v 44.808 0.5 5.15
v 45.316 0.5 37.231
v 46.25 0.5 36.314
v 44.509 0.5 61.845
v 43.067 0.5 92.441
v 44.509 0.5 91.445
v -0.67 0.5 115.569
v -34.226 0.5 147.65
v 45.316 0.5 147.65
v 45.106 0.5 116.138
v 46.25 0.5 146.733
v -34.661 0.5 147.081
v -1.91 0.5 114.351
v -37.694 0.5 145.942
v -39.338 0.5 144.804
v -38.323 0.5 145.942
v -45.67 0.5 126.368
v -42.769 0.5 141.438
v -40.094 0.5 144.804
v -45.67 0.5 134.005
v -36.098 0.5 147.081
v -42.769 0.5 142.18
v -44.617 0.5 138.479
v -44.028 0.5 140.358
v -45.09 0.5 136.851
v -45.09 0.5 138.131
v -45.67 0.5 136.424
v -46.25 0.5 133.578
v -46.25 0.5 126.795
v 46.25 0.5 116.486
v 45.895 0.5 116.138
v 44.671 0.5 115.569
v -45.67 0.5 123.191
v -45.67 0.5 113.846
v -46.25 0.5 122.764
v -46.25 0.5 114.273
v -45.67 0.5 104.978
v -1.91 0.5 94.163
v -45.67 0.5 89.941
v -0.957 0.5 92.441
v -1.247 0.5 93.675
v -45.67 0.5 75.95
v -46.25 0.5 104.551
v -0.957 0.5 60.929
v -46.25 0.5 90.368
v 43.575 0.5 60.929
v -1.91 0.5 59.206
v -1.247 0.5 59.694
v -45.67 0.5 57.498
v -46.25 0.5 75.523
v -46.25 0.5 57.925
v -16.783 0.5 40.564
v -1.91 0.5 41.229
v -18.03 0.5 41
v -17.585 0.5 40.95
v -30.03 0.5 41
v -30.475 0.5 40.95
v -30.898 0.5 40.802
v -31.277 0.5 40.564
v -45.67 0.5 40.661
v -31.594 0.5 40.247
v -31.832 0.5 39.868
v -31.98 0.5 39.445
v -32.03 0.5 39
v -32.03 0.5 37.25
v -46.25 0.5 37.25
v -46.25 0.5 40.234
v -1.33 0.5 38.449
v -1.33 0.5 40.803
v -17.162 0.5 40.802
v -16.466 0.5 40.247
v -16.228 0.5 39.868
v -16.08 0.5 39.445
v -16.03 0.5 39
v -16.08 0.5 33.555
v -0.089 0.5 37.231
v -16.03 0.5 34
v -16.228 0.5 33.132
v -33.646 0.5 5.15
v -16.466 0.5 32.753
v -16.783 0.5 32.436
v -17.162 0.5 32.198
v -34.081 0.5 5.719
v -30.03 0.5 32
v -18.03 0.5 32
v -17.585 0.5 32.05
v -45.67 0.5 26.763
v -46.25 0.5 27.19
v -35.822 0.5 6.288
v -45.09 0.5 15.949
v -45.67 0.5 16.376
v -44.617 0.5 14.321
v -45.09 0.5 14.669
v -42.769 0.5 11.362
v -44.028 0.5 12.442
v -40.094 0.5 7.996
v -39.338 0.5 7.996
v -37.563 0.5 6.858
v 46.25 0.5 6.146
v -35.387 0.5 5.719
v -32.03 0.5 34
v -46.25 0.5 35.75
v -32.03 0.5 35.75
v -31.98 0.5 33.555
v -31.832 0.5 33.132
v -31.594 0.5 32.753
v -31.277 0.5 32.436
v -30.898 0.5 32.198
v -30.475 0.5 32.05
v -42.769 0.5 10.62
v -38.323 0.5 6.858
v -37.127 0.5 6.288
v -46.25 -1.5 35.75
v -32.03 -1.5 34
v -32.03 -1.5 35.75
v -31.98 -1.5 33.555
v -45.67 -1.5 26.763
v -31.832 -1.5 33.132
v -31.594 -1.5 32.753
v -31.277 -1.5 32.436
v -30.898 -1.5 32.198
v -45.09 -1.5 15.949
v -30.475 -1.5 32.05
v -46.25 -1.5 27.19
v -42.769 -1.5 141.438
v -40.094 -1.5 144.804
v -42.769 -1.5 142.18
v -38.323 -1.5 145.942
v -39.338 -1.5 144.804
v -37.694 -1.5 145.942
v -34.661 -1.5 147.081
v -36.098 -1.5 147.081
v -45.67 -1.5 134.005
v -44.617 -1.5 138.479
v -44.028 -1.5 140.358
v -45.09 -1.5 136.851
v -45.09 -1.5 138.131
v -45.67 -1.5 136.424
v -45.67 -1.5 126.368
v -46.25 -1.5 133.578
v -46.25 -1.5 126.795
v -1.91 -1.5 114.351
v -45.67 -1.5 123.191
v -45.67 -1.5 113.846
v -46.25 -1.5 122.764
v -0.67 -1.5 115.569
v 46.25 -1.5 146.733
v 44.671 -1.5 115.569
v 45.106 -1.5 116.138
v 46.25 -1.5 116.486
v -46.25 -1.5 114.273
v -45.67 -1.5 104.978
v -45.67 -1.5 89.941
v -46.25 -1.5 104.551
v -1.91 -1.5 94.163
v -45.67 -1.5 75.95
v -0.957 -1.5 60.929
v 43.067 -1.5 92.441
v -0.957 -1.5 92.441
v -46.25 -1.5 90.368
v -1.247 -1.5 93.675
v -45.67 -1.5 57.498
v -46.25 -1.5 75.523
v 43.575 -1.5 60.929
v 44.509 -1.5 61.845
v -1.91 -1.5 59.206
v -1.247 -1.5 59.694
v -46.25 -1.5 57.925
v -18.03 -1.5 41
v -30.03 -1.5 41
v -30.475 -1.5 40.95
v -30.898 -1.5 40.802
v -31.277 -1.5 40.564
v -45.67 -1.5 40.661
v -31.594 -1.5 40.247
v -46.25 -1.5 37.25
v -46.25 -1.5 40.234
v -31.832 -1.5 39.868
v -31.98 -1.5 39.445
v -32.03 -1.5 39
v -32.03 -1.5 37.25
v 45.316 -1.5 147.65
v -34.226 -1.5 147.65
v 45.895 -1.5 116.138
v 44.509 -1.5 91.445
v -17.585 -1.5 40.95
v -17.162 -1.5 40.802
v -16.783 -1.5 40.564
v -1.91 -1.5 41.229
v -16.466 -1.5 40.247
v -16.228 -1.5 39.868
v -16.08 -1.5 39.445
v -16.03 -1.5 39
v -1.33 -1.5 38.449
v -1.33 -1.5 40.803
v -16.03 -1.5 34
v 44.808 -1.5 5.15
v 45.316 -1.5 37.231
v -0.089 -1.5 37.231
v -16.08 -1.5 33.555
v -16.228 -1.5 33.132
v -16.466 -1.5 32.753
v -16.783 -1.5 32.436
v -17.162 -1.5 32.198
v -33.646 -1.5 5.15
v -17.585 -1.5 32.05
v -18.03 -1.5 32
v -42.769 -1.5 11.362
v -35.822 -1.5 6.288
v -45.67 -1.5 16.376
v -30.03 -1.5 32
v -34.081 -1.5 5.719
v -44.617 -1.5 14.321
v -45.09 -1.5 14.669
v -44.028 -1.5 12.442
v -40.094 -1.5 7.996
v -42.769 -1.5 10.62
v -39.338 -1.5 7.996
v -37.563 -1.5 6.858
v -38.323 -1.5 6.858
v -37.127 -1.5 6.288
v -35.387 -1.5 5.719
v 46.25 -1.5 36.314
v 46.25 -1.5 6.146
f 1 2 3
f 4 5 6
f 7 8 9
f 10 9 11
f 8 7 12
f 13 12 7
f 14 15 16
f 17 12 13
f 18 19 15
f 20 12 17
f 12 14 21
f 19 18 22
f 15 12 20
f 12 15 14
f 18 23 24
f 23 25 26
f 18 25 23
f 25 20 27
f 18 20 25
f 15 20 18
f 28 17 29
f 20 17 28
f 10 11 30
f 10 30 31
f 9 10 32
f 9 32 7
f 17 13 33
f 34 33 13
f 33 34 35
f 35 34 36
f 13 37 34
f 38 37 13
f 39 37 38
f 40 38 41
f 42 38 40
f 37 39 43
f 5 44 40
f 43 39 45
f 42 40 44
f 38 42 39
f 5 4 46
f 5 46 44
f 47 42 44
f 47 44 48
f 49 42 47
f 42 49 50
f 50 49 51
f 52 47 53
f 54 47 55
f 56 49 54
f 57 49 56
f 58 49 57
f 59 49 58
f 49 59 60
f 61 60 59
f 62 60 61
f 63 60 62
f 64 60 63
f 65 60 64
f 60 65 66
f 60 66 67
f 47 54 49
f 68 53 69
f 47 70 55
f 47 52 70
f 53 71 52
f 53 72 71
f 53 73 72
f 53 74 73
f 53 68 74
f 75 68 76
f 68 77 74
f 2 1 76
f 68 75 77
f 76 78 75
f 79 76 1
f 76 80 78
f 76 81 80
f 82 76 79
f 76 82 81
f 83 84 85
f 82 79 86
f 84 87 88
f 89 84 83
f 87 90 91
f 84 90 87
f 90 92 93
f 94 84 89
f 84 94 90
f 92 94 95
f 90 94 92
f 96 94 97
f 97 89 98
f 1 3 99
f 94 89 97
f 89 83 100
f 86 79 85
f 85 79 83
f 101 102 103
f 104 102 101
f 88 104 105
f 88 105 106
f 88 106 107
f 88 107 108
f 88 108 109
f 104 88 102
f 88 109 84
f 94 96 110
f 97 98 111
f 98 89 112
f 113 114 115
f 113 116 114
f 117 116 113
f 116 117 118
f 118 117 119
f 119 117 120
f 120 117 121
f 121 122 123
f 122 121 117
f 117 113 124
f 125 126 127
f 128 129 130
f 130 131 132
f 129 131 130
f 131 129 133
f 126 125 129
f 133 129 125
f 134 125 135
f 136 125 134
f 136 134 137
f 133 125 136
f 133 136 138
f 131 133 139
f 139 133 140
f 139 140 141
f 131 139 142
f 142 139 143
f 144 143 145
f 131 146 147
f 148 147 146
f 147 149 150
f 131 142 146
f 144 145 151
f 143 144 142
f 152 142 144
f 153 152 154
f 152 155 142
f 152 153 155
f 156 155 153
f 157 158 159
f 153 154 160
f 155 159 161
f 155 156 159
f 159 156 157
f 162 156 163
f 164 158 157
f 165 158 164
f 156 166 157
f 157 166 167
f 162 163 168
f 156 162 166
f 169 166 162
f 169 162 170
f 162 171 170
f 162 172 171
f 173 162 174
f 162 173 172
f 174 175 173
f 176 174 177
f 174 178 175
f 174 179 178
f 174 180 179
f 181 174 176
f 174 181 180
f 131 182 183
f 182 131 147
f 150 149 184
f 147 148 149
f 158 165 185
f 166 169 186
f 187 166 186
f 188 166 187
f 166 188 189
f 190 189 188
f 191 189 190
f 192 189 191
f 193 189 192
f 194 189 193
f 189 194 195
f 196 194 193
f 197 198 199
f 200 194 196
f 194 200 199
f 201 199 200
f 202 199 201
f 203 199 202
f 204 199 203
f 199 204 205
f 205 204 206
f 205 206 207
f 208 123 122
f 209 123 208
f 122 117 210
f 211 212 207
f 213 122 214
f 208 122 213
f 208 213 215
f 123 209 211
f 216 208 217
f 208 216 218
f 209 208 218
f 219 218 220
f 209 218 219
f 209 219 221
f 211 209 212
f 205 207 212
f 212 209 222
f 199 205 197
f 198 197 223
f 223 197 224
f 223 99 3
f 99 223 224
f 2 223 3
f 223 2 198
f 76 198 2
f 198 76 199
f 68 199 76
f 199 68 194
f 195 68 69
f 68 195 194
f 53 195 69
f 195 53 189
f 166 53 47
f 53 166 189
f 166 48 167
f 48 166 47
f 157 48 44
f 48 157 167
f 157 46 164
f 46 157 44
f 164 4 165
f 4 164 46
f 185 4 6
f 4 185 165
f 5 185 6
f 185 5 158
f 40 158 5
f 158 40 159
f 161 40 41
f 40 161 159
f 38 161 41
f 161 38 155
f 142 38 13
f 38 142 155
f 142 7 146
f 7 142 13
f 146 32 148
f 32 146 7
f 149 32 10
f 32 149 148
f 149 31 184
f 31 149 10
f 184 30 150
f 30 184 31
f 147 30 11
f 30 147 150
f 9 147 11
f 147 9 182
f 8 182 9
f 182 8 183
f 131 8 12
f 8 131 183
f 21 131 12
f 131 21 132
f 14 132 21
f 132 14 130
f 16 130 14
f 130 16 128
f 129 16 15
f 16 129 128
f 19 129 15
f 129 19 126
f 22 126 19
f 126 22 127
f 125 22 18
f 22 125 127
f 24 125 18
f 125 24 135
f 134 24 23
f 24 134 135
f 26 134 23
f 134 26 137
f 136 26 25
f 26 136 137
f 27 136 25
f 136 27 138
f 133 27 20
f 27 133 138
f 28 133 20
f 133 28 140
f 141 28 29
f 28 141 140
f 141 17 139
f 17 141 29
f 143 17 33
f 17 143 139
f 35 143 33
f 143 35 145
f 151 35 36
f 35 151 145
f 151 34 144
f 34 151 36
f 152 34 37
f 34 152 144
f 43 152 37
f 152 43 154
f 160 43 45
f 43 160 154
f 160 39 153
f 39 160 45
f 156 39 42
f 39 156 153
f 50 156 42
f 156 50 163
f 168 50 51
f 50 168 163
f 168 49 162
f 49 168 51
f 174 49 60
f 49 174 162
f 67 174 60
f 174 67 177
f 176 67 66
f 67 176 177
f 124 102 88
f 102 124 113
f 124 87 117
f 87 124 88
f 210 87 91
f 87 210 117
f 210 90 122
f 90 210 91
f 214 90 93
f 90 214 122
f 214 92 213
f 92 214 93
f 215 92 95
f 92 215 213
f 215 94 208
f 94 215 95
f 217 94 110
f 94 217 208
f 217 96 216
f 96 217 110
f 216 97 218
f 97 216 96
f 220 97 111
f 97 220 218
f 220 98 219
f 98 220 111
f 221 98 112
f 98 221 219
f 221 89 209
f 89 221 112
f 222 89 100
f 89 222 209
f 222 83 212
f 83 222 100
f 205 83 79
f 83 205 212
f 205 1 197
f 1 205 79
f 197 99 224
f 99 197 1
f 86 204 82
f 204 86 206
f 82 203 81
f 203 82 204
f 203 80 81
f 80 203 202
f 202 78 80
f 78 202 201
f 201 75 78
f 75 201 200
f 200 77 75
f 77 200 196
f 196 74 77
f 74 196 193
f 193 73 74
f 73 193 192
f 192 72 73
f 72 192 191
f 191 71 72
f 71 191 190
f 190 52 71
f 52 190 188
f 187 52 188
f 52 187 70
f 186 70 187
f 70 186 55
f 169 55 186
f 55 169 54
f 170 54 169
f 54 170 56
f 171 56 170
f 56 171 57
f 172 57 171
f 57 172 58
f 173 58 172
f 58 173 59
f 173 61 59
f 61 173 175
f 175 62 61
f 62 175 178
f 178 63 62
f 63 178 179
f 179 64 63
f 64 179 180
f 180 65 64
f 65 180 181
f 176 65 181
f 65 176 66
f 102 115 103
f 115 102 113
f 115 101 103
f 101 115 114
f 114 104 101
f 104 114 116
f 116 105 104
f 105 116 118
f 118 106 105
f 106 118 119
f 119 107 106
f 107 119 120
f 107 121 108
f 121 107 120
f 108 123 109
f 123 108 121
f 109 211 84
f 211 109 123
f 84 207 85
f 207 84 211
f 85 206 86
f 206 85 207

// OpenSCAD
// file: shape_pts.scad
// Traced from images/engenesis_e.png via octolamp-lamp-base/scripts/trace_image_to_scad.py
// Housing exterior: 100.00 mm (X) x 150.00 mm (Z) (94.00 x 144.00 mm interior cavity + 3.00 mm Octolamp wall).
// Diffuser silhouette matches Housing everywhere except the top-left shallow concave curve per blueprint.

shape_w = 94.00;
shape_h = 144.00;
rec_chip_x = -24.50;      // Centered in the vertical stem floor (X = -44.0 .. -5.0 mm)
rec_chip_z = 82.00;       // Upper-mid stem, leaving wide room below for zip-tie holes & keyhole
rec_cable_x = -24.50;     // Directly inline beneath the Sparkle Motion Mini USB-C port
rec_ziptie_z = 33.50;     // 2x D = 5.0 mm zip-tie strain-relief holes
rec_keyhole_z = 19.50;    // D = 14.2 mm keyhole + straight 4.0 mm retention neck
rec_slit_dir = -1;        // 1.50 mm reflector wire slit opens out the nearest (-X left stem) edge
rec_snap_top_x = 10.00;   // Centered on the flat top arm (clear of the top-left concave curve!)
rec_snap_bot_x = 0.00;    // Centered on the flat bottom arm
rec_pillars = [[25.0, 16.5], [22.0, 72.0], [25.0, 127.5], [-24.5, 128.0]];

shape_pts = [
    [0.218,33.581], [-0.58,34.364], [-0.58,36.783], [-1.16,37.209], [-1.16,54.427], [-0.58,54.854],
    [-0.363,55.779], [43.881,55.779], [45.259,57.13], [45.259,87.439], [43.301,88.791], [-0.363,88.791],
    [-0.58,89.715], [-1.16,90.142], [-1.16,109.636], [-0.363,110.419], [45.042,110.419], [45.477,110.988],
    [46.202,110.988], [47.0,111.771], [47.0,142.648], [45.622,144.0], [-34.597,144.0], [-35.032,143.431],
    [-36.338,143.431], [-37.934,142.292], [-38.659,142.292], [-39.674,141.154], [-40.4,141.154], [-43.519,138.095],
    [-43.519,137.383], [-44.679,136.387], [-45.259,134.538], [-45.84,134.111], [-45.84,132.83], [-46.42,132.403],
    [-46.42,129.984], [-47.0,129.557], [-47.0,122.016], [-46.42,121.589], [-46.42,119.17], [-47.0,118.743],
    [-47.0,109.494], [-46.42,109.067], [-46.42,100.957], [-47.0,100.53], [-47.0,85.589], [-46.42,85.162],
    [-46.42,71.929], [-47.0,71.502], [-47.0,53.146], [-46.42,52.719], [-46.42,36.64], [-47.0,36.213],
    [-47.0,22.411], [-46.42,21.984], [-46.42,11.597], [-45.84,11.17], [-45.84,9.889], [-45.259,9.462],
    [-44.679,7.613], [-43.519,6.617], [-43.519,5.905], [-40.4,2.846], [-39.674,2.846], [-38.659,1.708],
    [-37.934,1.708], [-37.498,1.138], [-36.193,1.138], [-35.758,0.569], [-34.452,0.569], [-34.017,0.0],
    [45.042,0.0], [47.0,1.352], [47.0,32.229], [45.622,33.581]
];
shape_paths = [[0, 1, 2, 3, 4, 5, 6, 7, 8, 9, 10, 11, 12, 13, 14, 15, 16, 17, 18, 19, 20, 21, 22, 23, 24, 25, 26, 27, 28, 29, 30, 31, 32, 33, 34, 35, 36, 37, 38, 39, 40, 41, 42, 43, 44, 45, 46, 47, 48, 49, 50, 51, 52, 53, 54, 55, 56, 57, 58, 59, 60, 61, 62, 63, 64, 65, 66, 67, 68, 69, 70, 71, 72, 73, 74, 75]];

diffuser_shape_pts = [
    [0.218,33.581], [-0.58,34.364], [-0.58,36.783], [-1.16,37.209], [-1.16,54.427], [-0.58,54.854],
    [-0.363,55.779], [43.881,55.779], [45.259,57.13], [45.259,87.439], [43.301,88.791], [-0.363,88.791],
    [-0.58,89.715], [-1.16,90.142], [-1.16,109.636], [-0.363,110.419], [45.042,110.419], [45.477,110.988],
    [46.202,110.988], [47.0,111.771], [47.0,142.648], [45.622,144.0], [-23.005,144.0], [-23.429,143.431],
    [-24.137,143.431], [-26.614,140.941], [-26.614,140.229], [-32.489,134.324], [-33.197,134.324], [-34.188,133.186],
    [-36.029,132.617], [-36.453,132.047], [-38.294,131.478], [-38.718,130.909], [-39.992,130.909], [-40.417,130.34],
    [-42.258,130.34], [-42.682,129.771], [-45.089,129.771], [-46.434,128.419], [-46.434,127.708], [-47.0,127.281],
    [-46.42,119.17], [-47.0,118.743], [-47.0,109.494], [-46.42,109.067], [-46.42,100.957], [-47.0,100.53],
    [-47.0,85.589], [-46.42,85.162], [-46.42,71.929], [-47.0,71.502], [-47.0,53.146], [-46.42,52.719],
    [-46.42,36.64], [-47.0,36.213], [-47.0,22.411], [-46.42,21.984], [-46.42,11.597], [-45.84,11.17],
    [-45.84,9.889], [-45.259,9.462], [-44.679,7.613], [-43.519,6.617], [-43.519,5.905], [-40.4,2.846],
    [-39.674,2.846], [-38.659,1.708], [-37.934,1.708], [-37.498,1.138], [-36.193,1.138], [-35.758,0.569],
    [-34.452,0.569], [-34.017,0.0], [45.042,0.0], [47.0,1.352], [47.0,32.229], [45.622,33.581]
];
diffuser_shape_paths = [[0, 1, 2, 3, 4, 5, 6, 7, 8, 9, 10, 11, 12, 13, 14, 15, 16, 17, 18, 19, 20, 21, 22, 23, 24, 25, 26, 27, 28, 29, 30, 31, 32, 33, 34, 35, 36, 37, 38, 39, 40, 41, 42, 43, 44, 45, 46, 47, 48, 49, 50, 51, 52, 53, 54, 55, 56, 57, 58, 59, 60, 61, 62, 63, 64, 65, 66, 67, 68, 69, 70, 71, 72, 73, 74, 75, 76, 77]];

module shape_2d(pts = shape_pts) {
    polygon(points = pts, paths = shape_paths);
}

module diffuser_shape_2d(pts = diffuser_shape_pts) {
    polygon(points = pts, paths = diffuser_shape_paths);
}
// main file
// Letter "E" internal white reflector plate (2.00 mm thick, 16 x 9 mm cable pocket + 1.50 mm side-entry wire slit).
// Opens and exports standalone in OpenSCAD / OpenSCAD.js.

use <lamp_core.scad>

render_lamp_part("reflector");
